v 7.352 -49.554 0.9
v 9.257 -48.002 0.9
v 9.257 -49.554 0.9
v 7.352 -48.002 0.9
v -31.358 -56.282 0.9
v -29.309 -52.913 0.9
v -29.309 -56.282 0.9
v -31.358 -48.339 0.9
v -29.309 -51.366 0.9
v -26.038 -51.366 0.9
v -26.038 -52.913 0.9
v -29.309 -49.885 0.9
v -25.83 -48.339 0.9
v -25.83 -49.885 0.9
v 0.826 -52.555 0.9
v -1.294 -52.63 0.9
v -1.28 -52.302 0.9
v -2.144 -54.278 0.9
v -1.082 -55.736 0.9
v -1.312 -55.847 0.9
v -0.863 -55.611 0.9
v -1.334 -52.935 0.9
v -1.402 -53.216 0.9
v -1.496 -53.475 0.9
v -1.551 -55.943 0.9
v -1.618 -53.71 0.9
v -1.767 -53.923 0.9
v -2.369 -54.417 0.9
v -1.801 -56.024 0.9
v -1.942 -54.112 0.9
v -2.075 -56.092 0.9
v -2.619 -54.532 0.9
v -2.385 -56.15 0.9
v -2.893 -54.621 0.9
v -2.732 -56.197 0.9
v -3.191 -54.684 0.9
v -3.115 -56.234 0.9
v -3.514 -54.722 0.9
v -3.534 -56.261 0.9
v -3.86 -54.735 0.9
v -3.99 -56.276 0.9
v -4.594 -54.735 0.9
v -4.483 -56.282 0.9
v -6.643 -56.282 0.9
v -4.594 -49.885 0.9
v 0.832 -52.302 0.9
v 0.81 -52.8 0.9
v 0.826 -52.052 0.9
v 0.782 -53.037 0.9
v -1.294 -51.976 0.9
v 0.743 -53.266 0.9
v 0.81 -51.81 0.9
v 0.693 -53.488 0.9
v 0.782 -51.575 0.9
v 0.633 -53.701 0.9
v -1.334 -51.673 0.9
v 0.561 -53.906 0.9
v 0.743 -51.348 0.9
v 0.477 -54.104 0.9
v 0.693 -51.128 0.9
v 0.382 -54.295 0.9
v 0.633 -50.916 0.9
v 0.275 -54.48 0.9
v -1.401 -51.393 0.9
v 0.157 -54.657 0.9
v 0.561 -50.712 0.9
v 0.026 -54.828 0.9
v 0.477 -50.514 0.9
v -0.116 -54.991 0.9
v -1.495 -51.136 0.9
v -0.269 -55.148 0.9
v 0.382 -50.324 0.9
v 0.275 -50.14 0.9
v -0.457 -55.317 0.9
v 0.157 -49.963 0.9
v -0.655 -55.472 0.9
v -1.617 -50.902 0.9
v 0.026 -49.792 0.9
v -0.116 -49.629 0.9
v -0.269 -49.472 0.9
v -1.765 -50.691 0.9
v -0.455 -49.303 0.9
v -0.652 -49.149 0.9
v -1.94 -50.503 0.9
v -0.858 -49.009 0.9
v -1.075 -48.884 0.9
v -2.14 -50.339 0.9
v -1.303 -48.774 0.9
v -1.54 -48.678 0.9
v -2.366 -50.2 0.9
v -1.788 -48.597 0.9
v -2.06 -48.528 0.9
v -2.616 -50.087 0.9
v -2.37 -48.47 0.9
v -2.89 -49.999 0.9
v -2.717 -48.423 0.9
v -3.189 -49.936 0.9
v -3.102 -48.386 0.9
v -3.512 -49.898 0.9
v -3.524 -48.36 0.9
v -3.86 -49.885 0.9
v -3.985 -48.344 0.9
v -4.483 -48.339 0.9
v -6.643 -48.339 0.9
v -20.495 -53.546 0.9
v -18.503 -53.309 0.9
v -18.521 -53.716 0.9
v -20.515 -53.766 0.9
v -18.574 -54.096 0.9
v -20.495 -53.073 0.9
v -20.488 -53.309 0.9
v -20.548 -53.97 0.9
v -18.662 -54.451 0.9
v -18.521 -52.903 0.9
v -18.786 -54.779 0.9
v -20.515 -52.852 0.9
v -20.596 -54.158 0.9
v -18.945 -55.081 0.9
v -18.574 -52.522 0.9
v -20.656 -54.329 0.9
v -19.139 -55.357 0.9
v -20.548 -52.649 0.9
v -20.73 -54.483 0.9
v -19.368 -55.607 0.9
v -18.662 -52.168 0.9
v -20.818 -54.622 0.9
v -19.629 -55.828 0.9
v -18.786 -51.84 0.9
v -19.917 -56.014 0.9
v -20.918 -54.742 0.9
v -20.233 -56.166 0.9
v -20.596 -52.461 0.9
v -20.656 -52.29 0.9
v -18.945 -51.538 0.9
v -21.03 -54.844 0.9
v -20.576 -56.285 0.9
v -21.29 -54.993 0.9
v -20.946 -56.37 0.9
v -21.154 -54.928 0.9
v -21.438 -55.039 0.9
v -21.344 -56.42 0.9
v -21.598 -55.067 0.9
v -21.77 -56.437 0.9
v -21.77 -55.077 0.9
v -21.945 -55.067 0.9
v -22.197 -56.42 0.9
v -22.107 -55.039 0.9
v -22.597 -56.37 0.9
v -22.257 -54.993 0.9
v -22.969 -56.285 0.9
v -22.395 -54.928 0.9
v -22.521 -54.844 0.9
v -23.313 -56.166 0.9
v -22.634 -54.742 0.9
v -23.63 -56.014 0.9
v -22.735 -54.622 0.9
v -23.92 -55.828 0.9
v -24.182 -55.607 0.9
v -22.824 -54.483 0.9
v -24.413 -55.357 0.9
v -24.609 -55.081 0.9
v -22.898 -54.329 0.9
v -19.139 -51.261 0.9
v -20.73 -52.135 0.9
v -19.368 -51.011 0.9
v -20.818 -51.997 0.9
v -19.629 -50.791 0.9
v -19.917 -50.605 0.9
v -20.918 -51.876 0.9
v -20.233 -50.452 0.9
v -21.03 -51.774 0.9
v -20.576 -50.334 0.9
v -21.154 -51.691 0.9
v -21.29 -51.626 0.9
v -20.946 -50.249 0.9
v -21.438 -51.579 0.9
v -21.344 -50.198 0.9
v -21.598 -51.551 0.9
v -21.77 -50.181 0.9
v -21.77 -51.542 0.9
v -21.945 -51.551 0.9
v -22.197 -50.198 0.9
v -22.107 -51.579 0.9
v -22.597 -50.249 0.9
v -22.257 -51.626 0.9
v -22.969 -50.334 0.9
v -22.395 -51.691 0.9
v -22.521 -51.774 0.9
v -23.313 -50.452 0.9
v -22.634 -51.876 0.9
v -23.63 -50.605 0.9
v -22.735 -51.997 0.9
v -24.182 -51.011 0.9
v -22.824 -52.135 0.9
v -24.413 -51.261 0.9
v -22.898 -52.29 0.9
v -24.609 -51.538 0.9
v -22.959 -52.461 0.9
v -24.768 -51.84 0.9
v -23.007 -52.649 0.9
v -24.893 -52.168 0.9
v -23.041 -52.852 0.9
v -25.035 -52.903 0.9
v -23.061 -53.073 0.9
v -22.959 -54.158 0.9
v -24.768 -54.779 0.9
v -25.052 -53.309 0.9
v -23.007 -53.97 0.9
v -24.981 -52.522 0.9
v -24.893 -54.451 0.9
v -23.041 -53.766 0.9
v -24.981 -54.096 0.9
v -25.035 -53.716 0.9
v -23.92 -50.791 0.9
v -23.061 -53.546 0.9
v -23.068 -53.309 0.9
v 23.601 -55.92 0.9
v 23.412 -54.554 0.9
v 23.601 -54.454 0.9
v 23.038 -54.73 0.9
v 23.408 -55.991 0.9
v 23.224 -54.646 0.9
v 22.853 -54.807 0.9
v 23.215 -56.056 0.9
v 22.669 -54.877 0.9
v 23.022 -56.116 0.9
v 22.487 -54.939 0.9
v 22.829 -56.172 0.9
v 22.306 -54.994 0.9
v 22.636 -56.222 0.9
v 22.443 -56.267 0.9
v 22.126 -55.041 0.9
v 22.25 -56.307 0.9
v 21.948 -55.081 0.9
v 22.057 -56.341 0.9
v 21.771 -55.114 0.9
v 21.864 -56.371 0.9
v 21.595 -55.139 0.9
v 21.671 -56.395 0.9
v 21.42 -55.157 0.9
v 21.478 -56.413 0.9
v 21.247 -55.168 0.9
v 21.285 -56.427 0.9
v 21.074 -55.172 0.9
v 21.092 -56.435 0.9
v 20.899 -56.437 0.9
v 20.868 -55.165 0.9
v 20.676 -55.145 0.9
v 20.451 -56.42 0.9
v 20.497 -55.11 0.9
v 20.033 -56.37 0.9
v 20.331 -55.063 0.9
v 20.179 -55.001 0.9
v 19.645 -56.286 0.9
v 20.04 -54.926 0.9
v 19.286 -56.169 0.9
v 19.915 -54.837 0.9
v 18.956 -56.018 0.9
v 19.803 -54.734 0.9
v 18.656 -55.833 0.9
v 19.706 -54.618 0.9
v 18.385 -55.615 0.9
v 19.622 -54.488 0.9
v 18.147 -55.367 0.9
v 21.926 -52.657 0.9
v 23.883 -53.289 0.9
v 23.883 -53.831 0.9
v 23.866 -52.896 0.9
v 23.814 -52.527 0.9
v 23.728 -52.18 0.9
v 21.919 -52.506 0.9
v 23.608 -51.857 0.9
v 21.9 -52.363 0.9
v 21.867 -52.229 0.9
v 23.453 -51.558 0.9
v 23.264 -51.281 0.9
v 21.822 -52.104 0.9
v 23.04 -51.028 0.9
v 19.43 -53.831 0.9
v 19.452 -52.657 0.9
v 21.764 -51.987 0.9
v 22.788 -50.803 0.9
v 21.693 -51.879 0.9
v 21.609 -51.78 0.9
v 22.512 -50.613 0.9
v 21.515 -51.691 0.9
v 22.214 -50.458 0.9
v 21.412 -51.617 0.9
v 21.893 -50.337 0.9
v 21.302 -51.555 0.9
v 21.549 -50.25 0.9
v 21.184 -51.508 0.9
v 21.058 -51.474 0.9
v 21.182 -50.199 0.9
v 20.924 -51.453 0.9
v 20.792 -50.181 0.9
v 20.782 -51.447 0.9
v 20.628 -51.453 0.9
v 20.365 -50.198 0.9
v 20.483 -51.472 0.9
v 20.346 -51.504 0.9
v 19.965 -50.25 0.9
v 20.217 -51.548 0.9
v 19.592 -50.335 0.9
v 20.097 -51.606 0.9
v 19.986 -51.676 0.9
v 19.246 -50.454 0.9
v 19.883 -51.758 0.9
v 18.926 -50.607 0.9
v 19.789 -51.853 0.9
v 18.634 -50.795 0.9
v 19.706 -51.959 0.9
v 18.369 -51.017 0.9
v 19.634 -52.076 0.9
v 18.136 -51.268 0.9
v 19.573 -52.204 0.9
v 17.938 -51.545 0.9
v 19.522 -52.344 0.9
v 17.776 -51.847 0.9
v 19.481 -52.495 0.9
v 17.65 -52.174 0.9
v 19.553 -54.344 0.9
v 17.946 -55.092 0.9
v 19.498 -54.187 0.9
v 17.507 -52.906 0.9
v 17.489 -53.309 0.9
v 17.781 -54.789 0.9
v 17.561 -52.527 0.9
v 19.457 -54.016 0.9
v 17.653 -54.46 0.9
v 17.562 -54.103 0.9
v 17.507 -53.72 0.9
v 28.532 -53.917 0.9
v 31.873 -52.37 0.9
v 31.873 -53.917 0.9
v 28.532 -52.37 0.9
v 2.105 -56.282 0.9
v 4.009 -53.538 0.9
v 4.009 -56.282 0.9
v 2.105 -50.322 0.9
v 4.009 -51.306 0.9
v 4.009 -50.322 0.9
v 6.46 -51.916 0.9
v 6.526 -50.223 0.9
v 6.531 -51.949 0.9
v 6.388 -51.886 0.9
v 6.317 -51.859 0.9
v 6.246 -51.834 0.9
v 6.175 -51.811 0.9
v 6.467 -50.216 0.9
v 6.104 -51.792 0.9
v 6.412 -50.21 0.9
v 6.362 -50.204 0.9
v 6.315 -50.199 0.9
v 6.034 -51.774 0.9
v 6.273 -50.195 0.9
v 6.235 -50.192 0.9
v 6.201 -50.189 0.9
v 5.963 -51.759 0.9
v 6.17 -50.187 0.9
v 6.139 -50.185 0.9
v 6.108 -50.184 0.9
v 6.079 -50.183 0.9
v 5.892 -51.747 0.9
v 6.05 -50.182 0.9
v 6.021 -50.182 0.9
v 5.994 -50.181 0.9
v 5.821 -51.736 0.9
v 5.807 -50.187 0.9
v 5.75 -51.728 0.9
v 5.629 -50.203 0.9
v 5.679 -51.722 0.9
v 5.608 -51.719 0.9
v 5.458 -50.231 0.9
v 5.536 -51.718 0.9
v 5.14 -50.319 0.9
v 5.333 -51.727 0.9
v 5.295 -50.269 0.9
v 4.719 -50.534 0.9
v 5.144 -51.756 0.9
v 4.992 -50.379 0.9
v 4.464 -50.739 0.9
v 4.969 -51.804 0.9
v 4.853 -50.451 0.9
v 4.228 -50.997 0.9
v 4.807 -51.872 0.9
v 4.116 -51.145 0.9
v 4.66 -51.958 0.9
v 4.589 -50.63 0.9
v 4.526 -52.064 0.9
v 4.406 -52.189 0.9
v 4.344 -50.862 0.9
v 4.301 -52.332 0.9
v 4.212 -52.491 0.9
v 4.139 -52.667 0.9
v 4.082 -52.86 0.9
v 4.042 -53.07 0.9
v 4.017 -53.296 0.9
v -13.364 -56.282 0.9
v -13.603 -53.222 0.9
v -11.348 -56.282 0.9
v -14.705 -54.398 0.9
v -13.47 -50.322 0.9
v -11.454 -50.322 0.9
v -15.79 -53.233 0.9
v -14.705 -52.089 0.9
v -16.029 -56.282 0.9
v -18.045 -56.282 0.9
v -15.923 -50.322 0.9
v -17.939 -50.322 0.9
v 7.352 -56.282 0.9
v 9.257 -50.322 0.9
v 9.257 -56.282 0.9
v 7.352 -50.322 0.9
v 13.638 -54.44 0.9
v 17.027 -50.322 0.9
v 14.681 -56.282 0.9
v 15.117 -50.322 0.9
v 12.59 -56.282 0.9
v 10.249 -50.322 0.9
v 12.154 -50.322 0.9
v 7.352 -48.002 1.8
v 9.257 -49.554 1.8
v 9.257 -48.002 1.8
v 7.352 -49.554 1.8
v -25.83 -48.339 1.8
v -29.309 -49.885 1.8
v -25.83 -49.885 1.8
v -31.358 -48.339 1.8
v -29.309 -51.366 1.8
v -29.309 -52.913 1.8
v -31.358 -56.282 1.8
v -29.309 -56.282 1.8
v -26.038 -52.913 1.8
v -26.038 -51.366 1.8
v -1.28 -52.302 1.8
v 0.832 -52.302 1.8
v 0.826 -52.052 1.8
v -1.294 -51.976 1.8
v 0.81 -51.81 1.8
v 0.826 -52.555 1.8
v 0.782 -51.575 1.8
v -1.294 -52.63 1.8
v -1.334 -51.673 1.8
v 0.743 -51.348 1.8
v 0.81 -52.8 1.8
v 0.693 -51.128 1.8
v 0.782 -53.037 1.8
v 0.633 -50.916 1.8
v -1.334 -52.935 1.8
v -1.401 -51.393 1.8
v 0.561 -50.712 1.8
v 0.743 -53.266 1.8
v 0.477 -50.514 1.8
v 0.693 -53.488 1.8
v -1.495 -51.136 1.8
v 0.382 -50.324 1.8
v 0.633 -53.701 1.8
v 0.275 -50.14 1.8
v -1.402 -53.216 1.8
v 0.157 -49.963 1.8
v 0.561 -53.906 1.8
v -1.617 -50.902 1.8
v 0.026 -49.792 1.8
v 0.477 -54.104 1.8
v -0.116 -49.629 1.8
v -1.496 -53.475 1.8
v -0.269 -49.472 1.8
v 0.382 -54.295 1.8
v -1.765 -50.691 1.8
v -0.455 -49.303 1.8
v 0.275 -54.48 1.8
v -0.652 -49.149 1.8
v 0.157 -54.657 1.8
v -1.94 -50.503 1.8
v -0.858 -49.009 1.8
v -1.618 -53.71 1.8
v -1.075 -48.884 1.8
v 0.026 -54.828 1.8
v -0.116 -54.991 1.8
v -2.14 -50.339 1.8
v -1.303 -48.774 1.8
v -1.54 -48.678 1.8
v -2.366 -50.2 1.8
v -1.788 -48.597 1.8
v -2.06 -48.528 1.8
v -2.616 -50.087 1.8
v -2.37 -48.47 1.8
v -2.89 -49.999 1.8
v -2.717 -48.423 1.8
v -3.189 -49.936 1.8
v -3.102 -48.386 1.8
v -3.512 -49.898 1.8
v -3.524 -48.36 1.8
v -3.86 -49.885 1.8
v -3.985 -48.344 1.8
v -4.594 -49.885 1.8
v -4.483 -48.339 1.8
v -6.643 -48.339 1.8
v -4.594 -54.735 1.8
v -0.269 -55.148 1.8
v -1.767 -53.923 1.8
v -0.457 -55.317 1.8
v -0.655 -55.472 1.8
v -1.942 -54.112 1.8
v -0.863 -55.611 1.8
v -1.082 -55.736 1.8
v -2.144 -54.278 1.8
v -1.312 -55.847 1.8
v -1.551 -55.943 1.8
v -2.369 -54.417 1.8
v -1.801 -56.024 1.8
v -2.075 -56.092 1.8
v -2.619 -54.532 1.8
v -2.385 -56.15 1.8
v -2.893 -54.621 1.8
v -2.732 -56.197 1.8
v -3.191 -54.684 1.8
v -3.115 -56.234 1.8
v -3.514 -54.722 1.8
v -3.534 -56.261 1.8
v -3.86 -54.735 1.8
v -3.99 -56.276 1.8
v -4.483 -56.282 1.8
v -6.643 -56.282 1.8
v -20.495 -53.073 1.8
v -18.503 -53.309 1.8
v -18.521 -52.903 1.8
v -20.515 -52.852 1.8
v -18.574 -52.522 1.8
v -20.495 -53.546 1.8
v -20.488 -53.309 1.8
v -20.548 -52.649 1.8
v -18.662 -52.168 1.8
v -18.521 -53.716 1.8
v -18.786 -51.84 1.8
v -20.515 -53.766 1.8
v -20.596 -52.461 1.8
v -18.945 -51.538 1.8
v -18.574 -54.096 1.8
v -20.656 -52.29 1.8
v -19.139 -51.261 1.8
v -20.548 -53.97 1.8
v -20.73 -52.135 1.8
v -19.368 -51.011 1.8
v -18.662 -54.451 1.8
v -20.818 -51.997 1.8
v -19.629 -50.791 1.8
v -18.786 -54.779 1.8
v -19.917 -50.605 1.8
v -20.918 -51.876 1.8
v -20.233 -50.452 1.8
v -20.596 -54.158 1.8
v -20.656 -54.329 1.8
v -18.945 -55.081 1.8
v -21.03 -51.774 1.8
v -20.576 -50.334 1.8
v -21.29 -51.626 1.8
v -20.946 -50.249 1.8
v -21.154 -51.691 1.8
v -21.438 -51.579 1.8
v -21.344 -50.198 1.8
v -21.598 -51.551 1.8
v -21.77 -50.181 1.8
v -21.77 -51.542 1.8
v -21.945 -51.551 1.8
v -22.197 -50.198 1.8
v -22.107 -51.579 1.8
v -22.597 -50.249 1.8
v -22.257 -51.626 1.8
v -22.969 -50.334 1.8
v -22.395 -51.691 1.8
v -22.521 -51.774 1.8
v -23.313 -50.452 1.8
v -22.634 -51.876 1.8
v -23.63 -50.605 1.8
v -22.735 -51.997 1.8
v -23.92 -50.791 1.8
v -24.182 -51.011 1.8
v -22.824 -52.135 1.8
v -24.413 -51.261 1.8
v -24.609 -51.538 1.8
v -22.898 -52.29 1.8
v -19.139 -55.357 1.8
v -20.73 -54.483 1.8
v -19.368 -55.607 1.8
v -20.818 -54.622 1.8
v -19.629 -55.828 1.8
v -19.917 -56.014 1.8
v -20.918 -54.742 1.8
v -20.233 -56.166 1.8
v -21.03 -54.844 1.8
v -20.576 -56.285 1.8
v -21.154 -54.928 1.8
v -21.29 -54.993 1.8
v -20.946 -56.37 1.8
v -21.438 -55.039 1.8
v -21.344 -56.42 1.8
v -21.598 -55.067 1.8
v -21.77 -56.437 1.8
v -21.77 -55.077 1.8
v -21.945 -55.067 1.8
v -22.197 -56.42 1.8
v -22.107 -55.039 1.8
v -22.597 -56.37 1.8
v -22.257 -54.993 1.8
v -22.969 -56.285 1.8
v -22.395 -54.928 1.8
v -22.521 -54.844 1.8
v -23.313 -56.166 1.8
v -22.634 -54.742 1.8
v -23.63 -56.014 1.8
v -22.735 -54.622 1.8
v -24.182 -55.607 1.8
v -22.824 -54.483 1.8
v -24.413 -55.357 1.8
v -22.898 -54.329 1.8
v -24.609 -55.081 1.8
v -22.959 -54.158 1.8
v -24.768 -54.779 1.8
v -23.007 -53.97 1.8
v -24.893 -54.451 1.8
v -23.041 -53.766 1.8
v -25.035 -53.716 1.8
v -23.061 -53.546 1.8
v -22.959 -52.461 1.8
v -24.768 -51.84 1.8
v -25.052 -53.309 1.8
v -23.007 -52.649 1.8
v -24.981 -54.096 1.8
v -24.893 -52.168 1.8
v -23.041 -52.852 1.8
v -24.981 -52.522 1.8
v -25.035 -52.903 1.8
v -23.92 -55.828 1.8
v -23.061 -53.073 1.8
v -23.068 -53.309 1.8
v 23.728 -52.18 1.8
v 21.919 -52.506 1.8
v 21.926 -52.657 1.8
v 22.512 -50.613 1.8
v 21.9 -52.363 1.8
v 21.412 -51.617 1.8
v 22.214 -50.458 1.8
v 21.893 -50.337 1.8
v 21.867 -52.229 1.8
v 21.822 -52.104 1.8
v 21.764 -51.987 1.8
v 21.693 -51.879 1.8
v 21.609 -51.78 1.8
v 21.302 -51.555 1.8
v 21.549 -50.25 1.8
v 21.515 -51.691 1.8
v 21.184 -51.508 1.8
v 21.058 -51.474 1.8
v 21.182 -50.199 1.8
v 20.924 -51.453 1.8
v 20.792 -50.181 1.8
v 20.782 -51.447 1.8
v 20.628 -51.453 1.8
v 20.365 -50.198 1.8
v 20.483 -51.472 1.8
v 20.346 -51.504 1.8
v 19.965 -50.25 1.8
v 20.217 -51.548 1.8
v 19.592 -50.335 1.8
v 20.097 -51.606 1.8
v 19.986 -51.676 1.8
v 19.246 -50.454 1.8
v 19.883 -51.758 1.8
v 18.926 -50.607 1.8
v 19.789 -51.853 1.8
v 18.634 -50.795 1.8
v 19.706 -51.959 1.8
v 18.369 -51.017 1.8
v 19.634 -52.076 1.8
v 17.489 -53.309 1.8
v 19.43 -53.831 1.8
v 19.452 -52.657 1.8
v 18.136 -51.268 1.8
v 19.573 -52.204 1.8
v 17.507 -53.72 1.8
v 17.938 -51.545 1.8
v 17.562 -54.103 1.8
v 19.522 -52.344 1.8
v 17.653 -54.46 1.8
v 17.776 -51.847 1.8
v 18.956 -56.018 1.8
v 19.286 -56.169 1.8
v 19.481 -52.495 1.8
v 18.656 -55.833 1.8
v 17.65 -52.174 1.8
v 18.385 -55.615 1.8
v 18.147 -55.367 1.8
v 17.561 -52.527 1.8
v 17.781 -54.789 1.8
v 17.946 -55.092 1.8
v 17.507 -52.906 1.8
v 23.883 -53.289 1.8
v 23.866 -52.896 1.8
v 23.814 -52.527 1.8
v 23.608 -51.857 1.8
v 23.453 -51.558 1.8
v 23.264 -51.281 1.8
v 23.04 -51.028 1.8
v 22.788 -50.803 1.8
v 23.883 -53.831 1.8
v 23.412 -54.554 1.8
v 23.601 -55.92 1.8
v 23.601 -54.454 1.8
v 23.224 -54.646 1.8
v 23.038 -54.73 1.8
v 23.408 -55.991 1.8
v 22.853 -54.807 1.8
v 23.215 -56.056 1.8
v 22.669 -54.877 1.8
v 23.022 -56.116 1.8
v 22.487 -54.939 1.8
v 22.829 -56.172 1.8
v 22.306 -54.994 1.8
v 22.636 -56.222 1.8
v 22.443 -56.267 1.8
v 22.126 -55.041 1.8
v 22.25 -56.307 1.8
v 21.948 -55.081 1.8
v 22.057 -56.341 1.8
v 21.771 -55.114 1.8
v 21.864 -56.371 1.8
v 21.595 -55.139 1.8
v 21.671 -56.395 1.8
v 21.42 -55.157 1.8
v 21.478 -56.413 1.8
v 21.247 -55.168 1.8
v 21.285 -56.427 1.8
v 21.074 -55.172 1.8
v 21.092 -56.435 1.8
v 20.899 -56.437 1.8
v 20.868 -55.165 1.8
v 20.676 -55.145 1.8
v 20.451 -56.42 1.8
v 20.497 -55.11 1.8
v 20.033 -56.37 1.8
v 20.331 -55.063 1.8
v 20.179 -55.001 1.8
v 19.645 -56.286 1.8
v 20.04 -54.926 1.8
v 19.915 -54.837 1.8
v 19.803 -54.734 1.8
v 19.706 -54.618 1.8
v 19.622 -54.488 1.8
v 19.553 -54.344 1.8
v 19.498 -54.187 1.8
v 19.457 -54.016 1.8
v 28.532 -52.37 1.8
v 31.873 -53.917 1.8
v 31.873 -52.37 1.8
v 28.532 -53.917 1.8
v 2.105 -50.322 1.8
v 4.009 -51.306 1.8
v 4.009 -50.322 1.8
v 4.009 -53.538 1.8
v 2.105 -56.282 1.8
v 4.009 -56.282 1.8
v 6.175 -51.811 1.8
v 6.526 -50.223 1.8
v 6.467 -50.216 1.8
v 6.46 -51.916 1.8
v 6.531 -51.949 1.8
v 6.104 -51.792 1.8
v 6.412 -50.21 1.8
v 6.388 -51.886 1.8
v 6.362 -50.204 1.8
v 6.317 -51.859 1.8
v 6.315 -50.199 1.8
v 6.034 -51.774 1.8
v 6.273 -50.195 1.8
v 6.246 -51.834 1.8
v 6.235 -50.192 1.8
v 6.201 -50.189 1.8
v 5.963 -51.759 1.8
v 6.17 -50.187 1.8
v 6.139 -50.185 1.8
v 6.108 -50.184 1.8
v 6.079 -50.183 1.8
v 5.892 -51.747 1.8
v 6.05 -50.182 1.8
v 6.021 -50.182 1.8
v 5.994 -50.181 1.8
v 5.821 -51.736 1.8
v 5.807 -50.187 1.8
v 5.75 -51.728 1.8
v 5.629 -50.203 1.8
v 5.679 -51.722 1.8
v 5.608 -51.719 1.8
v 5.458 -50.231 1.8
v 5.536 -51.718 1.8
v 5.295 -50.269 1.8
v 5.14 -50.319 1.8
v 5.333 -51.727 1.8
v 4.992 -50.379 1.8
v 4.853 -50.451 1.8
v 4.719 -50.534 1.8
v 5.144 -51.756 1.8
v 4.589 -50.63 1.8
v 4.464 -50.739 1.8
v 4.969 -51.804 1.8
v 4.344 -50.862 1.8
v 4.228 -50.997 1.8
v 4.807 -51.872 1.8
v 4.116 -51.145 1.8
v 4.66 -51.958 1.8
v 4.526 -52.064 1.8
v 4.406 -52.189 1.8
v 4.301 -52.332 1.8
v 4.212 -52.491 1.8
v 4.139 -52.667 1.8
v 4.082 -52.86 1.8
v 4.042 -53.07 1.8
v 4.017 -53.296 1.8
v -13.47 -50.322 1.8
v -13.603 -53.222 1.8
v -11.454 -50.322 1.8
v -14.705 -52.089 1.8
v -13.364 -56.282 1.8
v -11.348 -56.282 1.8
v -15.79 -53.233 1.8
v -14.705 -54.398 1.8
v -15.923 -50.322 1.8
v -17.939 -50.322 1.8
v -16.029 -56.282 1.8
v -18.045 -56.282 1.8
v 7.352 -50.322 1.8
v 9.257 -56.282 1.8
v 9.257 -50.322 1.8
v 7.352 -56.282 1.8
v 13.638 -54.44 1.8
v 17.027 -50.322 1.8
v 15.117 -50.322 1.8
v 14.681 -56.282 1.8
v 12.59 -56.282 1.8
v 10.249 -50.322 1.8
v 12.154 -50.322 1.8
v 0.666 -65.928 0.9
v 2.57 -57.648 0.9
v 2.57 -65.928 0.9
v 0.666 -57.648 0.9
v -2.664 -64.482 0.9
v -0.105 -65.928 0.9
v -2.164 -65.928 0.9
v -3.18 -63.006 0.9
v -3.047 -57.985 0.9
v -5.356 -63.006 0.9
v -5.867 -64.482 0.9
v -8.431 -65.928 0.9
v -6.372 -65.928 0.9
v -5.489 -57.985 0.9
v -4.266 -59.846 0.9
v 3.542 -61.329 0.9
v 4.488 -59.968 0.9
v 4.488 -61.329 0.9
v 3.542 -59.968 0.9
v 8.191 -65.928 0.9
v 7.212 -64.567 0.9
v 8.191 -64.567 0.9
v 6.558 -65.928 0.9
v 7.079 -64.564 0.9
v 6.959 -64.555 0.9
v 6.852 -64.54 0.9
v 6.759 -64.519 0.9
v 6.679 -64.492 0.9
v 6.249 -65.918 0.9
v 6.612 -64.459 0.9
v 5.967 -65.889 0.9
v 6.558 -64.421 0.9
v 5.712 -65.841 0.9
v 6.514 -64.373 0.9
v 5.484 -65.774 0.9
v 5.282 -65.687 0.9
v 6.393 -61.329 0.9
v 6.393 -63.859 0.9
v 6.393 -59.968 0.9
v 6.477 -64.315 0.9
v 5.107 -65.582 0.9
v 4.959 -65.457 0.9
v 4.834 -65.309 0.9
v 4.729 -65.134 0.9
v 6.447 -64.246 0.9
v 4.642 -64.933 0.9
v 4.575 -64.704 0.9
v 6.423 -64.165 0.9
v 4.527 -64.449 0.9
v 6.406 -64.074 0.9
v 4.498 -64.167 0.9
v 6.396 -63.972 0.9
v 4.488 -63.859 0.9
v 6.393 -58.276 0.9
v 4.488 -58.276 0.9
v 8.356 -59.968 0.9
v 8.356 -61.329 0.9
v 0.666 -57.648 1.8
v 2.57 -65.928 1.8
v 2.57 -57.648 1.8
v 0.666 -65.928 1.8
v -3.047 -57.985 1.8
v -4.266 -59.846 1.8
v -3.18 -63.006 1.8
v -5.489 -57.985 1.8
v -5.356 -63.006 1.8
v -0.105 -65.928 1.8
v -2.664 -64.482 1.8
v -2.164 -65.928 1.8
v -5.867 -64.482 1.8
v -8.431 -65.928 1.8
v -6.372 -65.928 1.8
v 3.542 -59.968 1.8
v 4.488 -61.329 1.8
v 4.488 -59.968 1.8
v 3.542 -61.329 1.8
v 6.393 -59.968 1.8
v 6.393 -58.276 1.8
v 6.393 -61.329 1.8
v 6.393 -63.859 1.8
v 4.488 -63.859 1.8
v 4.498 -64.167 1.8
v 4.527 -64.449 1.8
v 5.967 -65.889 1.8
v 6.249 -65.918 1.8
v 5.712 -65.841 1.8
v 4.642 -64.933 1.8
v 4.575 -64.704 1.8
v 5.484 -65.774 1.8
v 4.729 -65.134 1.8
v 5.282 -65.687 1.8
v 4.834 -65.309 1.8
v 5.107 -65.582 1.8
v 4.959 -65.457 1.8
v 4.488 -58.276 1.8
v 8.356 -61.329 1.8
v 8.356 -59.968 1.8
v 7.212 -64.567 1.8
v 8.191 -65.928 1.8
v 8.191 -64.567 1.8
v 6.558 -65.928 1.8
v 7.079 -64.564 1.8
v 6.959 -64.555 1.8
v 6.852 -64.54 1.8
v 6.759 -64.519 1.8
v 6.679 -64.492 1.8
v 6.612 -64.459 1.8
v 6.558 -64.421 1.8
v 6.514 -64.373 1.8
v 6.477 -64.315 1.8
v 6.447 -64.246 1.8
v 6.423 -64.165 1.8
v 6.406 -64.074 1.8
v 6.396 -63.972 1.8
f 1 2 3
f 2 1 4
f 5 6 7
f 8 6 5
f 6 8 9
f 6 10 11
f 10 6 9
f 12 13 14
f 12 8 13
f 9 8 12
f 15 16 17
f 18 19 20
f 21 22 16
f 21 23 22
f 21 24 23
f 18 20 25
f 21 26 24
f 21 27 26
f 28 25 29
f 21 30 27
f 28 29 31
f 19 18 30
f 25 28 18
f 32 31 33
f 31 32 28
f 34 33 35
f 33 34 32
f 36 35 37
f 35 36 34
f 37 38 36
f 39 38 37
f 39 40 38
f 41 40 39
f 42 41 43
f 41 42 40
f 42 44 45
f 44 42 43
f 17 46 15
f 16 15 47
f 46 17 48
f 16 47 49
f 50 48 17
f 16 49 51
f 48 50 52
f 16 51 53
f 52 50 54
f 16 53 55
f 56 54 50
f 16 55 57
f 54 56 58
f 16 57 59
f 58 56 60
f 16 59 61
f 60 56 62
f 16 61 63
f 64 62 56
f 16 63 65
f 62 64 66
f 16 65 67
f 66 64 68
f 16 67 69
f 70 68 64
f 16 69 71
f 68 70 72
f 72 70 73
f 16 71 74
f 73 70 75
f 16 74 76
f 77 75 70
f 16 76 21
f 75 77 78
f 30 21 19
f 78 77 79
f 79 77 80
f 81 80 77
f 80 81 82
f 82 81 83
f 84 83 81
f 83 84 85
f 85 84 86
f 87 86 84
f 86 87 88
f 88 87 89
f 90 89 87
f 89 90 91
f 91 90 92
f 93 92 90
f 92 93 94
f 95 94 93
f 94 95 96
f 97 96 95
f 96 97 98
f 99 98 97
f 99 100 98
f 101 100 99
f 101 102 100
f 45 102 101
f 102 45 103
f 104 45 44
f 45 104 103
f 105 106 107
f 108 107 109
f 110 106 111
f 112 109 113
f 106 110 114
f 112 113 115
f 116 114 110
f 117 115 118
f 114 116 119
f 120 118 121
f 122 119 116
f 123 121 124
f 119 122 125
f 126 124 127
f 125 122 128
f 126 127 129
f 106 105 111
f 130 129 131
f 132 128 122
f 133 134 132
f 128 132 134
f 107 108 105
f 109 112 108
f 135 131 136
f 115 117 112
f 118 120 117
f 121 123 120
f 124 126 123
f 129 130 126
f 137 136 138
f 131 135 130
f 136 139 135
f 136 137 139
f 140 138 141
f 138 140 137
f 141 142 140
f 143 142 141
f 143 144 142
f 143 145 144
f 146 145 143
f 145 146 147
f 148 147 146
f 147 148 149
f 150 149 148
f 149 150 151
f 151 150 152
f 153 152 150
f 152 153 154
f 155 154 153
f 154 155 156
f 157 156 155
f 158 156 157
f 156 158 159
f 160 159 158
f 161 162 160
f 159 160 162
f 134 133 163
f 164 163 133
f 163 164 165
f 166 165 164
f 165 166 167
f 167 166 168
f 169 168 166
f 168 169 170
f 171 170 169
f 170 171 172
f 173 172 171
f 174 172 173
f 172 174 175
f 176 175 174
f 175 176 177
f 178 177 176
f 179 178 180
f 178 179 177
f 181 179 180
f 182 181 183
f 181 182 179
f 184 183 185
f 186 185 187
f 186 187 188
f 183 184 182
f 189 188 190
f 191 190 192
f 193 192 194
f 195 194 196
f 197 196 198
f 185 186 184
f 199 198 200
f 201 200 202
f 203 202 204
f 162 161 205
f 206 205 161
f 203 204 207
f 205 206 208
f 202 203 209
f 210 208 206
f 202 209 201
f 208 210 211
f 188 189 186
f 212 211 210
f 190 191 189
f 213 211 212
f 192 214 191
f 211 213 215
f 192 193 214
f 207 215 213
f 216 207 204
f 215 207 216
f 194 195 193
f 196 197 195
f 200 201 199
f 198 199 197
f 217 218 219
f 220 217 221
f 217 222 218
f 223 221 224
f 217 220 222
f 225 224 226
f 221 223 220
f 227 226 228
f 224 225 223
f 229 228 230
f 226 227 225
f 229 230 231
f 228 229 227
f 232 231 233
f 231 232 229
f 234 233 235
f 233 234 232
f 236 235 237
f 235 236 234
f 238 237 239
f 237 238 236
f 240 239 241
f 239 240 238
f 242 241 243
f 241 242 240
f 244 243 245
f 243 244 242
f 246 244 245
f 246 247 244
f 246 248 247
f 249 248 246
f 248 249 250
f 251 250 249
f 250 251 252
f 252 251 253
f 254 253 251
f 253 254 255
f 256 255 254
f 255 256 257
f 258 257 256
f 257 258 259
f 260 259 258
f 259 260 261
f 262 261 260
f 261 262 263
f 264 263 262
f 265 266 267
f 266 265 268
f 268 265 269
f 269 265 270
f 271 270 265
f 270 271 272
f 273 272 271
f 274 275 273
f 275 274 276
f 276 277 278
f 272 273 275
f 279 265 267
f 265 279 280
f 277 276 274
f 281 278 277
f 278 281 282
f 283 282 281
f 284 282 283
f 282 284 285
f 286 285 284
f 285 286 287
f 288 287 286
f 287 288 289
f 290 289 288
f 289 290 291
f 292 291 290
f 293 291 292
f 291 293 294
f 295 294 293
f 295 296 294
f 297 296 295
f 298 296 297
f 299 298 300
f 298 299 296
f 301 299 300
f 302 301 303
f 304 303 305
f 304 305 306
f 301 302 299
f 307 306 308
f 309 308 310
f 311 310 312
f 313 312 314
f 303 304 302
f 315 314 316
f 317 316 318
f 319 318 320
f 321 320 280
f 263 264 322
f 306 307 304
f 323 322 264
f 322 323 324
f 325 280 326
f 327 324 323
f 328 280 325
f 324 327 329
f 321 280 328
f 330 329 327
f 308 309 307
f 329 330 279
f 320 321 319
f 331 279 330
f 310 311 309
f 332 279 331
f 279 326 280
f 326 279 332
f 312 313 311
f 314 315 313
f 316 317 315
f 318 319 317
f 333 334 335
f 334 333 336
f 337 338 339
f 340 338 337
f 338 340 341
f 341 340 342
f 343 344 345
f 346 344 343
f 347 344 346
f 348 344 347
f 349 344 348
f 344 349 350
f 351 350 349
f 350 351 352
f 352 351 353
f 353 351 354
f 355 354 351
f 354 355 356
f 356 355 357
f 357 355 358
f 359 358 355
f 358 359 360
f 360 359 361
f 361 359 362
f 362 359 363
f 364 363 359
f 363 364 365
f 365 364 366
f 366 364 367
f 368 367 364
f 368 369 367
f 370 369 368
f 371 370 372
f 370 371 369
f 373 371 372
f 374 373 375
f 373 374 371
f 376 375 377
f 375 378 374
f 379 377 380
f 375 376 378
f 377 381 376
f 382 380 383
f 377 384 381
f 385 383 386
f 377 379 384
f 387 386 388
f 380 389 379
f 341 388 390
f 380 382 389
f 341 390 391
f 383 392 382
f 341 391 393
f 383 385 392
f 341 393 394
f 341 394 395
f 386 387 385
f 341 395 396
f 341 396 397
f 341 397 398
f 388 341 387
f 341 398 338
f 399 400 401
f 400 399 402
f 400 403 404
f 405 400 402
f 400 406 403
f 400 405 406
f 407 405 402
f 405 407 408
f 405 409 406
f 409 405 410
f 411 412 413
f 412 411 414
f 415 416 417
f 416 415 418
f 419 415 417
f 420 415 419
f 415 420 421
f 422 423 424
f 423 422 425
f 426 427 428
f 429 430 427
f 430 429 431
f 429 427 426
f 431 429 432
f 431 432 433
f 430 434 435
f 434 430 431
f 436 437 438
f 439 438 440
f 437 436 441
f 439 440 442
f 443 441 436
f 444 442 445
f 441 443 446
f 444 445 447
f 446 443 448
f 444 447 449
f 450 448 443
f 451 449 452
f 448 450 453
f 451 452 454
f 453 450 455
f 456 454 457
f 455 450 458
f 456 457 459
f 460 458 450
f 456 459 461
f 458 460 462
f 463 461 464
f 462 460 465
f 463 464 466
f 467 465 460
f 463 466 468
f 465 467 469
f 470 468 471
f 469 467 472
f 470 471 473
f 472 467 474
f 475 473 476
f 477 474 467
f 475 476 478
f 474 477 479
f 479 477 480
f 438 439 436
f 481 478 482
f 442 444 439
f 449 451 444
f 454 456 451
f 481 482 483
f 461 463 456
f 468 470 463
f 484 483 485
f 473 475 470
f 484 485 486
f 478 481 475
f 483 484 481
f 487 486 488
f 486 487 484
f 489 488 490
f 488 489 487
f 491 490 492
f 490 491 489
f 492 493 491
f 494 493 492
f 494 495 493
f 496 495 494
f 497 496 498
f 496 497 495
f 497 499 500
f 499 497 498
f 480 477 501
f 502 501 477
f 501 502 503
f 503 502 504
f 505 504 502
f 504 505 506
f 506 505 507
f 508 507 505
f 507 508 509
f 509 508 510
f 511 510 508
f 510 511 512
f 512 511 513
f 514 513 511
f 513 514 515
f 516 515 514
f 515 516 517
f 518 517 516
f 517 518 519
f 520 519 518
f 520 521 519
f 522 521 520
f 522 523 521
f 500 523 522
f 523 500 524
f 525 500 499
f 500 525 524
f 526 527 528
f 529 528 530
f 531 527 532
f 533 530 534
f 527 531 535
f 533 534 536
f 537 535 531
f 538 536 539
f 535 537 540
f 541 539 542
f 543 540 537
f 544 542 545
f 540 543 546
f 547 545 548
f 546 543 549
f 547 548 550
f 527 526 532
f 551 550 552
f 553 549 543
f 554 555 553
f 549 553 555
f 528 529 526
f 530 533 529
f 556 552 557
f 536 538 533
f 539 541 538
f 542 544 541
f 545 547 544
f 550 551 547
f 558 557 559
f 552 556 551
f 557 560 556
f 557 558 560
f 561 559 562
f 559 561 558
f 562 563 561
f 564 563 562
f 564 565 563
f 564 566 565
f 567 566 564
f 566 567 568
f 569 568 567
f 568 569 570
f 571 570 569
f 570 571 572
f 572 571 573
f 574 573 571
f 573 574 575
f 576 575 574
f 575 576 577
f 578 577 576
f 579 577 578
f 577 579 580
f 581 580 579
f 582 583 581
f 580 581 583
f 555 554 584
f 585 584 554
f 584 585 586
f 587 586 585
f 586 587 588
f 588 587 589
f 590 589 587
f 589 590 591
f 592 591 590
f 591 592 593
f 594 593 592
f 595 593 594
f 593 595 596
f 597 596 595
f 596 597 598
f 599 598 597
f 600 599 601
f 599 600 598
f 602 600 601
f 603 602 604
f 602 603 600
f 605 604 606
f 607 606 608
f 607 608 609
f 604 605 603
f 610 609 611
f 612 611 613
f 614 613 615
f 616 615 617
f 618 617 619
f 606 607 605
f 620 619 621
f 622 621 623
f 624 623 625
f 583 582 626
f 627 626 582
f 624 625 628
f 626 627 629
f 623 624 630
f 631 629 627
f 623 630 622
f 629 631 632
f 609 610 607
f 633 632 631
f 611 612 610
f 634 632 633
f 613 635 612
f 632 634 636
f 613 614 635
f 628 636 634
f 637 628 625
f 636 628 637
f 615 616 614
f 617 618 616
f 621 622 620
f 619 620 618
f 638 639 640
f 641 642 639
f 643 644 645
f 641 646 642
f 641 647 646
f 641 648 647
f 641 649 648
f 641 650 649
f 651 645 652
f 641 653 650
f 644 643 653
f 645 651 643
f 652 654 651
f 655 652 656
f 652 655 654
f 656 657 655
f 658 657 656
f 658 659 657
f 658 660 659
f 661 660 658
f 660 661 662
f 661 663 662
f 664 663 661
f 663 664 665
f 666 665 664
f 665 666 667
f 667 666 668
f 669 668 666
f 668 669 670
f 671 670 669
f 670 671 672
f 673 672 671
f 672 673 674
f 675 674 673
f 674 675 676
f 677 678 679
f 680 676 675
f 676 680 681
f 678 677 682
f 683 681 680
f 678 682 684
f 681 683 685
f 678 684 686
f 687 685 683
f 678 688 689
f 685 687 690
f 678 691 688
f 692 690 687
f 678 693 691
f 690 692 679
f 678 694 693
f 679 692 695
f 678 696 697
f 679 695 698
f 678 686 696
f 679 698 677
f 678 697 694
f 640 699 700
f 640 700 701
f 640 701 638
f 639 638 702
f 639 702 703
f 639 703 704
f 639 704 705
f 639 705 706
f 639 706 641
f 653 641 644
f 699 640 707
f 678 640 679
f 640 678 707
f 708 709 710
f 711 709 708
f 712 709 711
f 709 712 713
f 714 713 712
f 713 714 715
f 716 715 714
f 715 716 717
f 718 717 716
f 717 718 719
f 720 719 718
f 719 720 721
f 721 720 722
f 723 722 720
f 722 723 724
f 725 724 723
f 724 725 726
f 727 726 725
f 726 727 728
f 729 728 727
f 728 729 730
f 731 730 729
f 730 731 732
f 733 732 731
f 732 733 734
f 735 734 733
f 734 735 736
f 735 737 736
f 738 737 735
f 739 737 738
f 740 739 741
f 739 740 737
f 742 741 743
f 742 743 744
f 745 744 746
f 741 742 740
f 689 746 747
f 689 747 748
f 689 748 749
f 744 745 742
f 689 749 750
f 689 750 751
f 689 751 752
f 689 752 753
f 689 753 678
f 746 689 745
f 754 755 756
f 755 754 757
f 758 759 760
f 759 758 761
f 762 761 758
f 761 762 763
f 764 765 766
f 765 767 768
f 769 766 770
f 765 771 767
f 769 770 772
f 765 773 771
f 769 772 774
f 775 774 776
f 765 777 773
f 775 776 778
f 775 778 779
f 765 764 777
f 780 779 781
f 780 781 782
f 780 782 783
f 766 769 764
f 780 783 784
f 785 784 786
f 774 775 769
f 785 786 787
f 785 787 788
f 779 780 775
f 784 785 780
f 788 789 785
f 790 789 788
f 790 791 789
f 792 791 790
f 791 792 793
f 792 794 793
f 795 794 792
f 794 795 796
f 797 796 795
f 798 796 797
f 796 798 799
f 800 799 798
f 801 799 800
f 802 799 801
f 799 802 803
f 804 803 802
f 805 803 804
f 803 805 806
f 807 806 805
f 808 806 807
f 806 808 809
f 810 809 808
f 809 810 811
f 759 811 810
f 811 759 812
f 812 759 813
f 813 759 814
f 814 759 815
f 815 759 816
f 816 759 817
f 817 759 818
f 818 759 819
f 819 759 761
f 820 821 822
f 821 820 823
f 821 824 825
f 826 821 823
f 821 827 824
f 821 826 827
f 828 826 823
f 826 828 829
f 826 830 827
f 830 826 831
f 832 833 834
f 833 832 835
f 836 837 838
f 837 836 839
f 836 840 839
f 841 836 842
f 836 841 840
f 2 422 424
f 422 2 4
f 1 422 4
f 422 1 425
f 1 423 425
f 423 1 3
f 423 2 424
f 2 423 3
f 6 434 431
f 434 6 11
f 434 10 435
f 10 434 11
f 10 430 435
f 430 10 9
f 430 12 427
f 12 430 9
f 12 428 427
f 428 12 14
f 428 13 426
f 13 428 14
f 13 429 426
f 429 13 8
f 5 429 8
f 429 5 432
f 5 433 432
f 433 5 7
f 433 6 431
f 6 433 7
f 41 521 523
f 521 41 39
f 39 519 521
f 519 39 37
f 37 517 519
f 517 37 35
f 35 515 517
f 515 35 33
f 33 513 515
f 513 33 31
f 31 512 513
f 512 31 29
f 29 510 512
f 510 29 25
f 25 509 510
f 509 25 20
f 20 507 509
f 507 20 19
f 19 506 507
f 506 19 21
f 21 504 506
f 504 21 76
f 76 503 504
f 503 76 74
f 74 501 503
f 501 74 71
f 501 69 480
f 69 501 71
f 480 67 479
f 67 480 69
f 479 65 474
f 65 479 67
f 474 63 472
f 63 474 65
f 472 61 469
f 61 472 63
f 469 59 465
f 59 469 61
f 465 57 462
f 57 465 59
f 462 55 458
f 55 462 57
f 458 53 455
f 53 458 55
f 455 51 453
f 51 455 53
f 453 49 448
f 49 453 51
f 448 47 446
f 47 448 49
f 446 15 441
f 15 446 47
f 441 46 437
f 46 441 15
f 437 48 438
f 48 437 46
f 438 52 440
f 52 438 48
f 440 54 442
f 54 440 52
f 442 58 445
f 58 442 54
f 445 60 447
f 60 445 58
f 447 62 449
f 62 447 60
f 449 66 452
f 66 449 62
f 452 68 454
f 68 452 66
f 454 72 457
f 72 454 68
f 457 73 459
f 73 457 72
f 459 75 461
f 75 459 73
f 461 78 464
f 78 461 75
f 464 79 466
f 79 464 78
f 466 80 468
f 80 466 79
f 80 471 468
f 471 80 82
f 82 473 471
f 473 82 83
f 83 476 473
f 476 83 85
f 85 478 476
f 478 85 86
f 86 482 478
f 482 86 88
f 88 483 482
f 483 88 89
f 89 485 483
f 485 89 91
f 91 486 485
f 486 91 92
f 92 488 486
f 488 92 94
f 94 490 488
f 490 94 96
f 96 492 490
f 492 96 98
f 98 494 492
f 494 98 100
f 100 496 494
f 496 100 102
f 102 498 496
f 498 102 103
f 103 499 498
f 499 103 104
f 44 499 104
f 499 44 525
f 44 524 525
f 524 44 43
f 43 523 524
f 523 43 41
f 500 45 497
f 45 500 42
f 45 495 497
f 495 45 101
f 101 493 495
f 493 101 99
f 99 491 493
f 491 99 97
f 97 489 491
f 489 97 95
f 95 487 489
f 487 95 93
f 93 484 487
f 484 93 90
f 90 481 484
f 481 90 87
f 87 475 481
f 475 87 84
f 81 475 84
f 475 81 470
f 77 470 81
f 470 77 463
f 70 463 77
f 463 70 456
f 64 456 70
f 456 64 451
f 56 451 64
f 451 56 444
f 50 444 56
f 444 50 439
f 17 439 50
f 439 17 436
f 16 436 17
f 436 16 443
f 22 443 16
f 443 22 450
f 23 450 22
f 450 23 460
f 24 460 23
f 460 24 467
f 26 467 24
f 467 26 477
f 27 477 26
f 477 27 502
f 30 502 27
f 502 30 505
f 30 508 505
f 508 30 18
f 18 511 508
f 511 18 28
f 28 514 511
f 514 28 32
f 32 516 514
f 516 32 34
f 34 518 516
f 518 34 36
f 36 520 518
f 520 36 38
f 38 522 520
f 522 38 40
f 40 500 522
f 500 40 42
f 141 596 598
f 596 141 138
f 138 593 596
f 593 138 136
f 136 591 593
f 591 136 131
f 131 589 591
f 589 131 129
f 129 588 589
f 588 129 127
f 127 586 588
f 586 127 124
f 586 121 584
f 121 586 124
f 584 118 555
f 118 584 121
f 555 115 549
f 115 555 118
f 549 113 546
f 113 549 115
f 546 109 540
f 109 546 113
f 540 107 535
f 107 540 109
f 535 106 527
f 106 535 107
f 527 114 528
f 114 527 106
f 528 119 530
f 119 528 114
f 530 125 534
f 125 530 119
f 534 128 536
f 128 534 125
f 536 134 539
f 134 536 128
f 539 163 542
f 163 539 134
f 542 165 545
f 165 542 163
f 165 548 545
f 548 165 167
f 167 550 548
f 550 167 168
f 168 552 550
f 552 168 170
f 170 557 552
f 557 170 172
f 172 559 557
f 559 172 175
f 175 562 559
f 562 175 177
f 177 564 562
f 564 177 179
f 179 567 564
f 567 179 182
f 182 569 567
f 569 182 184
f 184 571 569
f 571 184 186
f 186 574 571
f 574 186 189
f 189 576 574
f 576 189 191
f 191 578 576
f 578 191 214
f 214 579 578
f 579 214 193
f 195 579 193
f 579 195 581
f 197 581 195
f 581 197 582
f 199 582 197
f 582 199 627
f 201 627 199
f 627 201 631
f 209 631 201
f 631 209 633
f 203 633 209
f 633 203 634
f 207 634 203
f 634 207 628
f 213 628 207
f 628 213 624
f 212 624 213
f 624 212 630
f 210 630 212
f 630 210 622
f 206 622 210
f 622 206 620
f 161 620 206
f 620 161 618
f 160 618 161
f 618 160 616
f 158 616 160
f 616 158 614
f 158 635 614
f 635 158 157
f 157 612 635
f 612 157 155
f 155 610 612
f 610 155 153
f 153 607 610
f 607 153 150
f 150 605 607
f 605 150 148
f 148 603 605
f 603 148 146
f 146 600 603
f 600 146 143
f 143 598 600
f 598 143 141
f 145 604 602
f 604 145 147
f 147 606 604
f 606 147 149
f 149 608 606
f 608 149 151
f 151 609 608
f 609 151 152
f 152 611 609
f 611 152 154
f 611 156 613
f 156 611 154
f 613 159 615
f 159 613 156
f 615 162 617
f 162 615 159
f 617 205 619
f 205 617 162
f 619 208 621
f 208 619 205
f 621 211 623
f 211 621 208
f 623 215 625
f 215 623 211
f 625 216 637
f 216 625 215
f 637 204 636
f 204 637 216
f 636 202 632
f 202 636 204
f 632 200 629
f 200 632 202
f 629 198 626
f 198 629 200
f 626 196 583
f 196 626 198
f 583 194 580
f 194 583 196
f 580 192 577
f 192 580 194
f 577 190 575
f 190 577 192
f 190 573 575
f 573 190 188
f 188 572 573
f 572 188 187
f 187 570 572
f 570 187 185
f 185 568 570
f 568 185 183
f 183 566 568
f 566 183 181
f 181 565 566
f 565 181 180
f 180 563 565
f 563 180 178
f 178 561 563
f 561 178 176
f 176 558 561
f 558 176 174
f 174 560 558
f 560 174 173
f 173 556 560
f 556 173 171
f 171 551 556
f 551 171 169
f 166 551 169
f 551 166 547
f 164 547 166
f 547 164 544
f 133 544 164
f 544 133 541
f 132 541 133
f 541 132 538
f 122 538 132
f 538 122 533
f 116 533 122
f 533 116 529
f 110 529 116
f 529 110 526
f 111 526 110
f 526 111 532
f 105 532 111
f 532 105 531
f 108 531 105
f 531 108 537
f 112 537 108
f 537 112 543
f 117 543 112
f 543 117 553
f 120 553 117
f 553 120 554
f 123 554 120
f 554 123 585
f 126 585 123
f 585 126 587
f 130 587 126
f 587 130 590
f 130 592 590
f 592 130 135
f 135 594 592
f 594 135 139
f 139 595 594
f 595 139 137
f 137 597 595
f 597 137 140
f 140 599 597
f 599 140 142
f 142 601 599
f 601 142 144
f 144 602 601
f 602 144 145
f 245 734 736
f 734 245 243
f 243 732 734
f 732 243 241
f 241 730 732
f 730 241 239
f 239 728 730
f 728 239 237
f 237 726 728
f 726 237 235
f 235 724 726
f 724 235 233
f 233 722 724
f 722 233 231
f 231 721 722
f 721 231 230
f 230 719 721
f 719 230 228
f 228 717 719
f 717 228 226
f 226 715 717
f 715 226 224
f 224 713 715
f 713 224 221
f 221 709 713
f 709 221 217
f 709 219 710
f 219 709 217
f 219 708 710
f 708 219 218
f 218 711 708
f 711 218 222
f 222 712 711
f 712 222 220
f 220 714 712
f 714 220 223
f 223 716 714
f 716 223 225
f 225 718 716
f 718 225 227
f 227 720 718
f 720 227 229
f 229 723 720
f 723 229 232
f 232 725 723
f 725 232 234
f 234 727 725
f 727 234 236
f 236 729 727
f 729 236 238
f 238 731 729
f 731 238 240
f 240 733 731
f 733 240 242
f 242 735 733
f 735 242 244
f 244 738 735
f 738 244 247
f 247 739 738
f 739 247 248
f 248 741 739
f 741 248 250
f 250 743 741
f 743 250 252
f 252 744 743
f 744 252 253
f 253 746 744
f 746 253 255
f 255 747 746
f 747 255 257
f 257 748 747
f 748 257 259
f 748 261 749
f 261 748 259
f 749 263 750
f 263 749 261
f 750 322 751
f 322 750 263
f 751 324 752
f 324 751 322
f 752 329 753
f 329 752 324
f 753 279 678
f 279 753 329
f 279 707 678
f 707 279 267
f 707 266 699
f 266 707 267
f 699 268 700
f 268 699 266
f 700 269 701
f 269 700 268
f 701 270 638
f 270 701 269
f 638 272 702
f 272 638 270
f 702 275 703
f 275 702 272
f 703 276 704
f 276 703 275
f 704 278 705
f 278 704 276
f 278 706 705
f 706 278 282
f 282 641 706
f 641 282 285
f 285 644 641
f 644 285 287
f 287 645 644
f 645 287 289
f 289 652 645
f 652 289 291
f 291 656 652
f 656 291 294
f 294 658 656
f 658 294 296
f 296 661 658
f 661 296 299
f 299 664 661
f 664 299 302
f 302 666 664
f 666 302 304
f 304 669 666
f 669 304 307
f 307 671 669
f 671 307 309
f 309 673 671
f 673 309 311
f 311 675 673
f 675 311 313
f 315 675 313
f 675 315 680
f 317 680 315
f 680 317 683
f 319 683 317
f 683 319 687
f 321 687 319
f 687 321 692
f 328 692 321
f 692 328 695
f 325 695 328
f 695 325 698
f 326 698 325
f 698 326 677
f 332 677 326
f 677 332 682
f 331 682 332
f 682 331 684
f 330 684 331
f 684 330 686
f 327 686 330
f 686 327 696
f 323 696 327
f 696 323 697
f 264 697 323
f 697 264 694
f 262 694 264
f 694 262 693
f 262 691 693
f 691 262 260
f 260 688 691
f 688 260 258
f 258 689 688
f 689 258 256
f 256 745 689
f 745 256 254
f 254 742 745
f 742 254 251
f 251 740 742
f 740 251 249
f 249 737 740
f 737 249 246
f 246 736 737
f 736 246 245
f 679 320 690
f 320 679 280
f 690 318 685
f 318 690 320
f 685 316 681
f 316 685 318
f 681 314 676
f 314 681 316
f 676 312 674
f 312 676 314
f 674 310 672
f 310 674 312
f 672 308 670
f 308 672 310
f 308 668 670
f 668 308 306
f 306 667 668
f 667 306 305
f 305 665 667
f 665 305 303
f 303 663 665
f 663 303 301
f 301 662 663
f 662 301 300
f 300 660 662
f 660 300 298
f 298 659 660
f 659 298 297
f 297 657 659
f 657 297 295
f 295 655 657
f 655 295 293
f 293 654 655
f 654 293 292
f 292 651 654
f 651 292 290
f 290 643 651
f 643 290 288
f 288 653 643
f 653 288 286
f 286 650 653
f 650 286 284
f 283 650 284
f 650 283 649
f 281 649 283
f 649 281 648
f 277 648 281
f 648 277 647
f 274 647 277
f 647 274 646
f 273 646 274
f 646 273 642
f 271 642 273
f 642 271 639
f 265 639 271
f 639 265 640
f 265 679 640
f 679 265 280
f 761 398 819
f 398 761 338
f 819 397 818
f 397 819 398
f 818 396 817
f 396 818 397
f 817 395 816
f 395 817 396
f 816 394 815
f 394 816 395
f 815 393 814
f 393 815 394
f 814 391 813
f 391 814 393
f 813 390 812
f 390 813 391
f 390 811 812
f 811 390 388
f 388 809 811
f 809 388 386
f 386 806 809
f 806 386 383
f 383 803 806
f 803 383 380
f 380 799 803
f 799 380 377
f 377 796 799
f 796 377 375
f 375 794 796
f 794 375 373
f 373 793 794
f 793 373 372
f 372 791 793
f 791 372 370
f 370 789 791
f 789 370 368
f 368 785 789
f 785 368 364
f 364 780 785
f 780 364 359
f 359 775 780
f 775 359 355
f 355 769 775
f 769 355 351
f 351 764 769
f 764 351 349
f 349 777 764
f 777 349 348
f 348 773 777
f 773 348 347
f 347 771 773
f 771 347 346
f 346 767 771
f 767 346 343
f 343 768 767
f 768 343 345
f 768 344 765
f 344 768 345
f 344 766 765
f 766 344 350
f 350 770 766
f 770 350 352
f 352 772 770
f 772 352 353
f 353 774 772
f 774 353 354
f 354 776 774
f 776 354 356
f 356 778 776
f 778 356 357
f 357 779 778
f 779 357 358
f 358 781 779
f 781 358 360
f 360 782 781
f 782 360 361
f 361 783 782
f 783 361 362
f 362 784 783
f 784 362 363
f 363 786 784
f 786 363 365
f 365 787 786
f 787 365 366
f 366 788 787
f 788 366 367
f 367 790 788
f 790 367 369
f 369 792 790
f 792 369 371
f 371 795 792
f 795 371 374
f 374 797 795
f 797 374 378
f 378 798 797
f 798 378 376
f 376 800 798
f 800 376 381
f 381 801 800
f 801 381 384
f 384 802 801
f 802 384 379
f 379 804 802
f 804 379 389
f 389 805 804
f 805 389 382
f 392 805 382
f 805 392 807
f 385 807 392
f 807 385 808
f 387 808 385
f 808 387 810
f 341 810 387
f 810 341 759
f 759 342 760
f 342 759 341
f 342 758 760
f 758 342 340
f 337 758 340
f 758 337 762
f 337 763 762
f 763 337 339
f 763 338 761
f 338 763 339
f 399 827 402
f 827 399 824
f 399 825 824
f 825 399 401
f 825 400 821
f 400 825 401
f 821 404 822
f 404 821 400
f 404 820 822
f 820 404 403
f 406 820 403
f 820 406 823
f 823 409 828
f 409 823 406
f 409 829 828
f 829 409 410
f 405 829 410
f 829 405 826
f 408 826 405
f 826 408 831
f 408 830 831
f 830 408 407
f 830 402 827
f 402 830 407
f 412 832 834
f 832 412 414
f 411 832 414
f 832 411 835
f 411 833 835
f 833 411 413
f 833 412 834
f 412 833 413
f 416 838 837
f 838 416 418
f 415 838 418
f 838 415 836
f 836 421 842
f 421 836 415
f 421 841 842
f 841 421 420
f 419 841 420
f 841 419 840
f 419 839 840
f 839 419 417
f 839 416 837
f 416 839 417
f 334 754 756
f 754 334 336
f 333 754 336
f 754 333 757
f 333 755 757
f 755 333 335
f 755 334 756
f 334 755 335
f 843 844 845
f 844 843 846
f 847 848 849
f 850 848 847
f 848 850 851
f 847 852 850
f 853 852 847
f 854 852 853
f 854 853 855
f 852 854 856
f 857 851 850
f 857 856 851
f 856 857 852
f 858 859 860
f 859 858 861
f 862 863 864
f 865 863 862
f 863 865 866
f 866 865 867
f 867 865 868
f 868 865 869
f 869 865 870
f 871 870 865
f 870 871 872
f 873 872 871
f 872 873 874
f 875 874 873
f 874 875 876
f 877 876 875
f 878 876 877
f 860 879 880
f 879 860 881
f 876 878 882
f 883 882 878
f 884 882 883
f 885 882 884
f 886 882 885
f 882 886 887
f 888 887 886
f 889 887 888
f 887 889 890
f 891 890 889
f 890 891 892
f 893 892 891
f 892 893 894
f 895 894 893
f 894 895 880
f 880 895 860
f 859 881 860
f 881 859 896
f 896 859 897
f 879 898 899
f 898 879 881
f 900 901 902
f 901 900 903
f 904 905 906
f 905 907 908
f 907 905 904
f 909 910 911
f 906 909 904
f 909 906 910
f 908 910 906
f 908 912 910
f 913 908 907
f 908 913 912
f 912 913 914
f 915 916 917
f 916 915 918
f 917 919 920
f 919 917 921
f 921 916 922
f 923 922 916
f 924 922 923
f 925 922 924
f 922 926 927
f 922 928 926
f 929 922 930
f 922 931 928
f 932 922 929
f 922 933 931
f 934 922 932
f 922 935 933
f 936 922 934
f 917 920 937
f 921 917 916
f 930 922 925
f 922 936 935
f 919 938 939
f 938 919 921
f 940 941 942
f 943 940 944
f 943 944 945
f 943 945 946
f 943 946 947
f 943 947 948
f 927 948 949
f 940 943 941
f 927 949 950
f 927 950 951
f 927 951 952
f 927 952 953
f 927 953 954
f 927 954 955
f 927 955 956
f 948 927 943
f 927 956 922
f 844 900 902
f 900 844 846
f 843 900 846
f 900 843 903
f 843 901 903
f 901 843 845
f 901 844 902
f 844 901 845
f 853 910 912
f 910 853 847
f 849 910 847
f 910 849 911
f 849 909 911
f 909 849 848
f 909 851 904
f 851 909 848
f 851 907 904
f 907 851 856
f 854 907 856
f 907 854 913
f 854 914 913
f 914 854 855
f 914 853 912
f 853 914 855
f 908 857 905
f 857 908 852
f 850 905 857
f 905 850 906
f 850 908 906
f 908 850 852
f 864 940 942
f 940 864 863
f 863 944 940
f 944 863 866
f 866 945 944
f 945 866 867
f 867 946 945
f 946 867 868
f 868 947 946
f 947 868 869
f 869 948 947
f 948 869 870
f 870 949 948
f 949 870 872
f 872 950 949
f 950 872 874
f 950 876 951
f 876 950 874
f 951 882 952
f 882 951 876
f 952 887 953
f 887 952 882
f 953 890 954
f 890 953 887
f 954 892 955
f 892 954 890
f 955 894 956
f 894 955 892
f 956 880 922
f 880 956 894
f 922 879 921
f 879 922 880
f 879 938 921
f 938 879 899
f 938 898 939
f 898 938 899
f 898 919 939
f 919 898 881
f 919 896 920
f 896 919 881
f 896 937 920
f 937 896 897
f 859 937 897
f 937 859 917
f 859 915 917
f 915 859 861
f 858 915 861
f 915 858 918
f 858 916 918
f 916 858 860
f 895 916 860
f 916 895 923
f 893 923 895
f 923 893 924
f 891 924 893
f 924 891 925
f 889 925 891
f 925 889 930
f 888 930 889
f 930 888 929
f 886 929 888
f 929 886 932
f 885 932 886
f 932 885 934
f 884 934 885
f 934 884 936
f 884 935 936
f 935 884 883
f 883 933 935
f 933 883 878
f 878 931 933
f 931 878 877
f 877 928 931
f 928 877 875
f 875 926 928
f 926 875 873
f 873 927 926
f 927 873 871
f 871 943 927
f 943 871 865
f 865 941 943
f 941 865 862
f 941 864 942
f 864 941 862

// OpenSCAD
$fn = 48;
  // English (below bottom hole)
  translate([0, -52.315, 0.900]) linear_extrude(height=0.900) text("Fox Drive -", size=7.845, halign="center", valign="center", font="Helvetica Neue:style=Bold");
  translate([0, -61.885, 0.900]) linear_extrude(height=0.900) text("Alt", size=7.845, halign="center", valign="center", font="Helvetica Neue:style=Bold");
